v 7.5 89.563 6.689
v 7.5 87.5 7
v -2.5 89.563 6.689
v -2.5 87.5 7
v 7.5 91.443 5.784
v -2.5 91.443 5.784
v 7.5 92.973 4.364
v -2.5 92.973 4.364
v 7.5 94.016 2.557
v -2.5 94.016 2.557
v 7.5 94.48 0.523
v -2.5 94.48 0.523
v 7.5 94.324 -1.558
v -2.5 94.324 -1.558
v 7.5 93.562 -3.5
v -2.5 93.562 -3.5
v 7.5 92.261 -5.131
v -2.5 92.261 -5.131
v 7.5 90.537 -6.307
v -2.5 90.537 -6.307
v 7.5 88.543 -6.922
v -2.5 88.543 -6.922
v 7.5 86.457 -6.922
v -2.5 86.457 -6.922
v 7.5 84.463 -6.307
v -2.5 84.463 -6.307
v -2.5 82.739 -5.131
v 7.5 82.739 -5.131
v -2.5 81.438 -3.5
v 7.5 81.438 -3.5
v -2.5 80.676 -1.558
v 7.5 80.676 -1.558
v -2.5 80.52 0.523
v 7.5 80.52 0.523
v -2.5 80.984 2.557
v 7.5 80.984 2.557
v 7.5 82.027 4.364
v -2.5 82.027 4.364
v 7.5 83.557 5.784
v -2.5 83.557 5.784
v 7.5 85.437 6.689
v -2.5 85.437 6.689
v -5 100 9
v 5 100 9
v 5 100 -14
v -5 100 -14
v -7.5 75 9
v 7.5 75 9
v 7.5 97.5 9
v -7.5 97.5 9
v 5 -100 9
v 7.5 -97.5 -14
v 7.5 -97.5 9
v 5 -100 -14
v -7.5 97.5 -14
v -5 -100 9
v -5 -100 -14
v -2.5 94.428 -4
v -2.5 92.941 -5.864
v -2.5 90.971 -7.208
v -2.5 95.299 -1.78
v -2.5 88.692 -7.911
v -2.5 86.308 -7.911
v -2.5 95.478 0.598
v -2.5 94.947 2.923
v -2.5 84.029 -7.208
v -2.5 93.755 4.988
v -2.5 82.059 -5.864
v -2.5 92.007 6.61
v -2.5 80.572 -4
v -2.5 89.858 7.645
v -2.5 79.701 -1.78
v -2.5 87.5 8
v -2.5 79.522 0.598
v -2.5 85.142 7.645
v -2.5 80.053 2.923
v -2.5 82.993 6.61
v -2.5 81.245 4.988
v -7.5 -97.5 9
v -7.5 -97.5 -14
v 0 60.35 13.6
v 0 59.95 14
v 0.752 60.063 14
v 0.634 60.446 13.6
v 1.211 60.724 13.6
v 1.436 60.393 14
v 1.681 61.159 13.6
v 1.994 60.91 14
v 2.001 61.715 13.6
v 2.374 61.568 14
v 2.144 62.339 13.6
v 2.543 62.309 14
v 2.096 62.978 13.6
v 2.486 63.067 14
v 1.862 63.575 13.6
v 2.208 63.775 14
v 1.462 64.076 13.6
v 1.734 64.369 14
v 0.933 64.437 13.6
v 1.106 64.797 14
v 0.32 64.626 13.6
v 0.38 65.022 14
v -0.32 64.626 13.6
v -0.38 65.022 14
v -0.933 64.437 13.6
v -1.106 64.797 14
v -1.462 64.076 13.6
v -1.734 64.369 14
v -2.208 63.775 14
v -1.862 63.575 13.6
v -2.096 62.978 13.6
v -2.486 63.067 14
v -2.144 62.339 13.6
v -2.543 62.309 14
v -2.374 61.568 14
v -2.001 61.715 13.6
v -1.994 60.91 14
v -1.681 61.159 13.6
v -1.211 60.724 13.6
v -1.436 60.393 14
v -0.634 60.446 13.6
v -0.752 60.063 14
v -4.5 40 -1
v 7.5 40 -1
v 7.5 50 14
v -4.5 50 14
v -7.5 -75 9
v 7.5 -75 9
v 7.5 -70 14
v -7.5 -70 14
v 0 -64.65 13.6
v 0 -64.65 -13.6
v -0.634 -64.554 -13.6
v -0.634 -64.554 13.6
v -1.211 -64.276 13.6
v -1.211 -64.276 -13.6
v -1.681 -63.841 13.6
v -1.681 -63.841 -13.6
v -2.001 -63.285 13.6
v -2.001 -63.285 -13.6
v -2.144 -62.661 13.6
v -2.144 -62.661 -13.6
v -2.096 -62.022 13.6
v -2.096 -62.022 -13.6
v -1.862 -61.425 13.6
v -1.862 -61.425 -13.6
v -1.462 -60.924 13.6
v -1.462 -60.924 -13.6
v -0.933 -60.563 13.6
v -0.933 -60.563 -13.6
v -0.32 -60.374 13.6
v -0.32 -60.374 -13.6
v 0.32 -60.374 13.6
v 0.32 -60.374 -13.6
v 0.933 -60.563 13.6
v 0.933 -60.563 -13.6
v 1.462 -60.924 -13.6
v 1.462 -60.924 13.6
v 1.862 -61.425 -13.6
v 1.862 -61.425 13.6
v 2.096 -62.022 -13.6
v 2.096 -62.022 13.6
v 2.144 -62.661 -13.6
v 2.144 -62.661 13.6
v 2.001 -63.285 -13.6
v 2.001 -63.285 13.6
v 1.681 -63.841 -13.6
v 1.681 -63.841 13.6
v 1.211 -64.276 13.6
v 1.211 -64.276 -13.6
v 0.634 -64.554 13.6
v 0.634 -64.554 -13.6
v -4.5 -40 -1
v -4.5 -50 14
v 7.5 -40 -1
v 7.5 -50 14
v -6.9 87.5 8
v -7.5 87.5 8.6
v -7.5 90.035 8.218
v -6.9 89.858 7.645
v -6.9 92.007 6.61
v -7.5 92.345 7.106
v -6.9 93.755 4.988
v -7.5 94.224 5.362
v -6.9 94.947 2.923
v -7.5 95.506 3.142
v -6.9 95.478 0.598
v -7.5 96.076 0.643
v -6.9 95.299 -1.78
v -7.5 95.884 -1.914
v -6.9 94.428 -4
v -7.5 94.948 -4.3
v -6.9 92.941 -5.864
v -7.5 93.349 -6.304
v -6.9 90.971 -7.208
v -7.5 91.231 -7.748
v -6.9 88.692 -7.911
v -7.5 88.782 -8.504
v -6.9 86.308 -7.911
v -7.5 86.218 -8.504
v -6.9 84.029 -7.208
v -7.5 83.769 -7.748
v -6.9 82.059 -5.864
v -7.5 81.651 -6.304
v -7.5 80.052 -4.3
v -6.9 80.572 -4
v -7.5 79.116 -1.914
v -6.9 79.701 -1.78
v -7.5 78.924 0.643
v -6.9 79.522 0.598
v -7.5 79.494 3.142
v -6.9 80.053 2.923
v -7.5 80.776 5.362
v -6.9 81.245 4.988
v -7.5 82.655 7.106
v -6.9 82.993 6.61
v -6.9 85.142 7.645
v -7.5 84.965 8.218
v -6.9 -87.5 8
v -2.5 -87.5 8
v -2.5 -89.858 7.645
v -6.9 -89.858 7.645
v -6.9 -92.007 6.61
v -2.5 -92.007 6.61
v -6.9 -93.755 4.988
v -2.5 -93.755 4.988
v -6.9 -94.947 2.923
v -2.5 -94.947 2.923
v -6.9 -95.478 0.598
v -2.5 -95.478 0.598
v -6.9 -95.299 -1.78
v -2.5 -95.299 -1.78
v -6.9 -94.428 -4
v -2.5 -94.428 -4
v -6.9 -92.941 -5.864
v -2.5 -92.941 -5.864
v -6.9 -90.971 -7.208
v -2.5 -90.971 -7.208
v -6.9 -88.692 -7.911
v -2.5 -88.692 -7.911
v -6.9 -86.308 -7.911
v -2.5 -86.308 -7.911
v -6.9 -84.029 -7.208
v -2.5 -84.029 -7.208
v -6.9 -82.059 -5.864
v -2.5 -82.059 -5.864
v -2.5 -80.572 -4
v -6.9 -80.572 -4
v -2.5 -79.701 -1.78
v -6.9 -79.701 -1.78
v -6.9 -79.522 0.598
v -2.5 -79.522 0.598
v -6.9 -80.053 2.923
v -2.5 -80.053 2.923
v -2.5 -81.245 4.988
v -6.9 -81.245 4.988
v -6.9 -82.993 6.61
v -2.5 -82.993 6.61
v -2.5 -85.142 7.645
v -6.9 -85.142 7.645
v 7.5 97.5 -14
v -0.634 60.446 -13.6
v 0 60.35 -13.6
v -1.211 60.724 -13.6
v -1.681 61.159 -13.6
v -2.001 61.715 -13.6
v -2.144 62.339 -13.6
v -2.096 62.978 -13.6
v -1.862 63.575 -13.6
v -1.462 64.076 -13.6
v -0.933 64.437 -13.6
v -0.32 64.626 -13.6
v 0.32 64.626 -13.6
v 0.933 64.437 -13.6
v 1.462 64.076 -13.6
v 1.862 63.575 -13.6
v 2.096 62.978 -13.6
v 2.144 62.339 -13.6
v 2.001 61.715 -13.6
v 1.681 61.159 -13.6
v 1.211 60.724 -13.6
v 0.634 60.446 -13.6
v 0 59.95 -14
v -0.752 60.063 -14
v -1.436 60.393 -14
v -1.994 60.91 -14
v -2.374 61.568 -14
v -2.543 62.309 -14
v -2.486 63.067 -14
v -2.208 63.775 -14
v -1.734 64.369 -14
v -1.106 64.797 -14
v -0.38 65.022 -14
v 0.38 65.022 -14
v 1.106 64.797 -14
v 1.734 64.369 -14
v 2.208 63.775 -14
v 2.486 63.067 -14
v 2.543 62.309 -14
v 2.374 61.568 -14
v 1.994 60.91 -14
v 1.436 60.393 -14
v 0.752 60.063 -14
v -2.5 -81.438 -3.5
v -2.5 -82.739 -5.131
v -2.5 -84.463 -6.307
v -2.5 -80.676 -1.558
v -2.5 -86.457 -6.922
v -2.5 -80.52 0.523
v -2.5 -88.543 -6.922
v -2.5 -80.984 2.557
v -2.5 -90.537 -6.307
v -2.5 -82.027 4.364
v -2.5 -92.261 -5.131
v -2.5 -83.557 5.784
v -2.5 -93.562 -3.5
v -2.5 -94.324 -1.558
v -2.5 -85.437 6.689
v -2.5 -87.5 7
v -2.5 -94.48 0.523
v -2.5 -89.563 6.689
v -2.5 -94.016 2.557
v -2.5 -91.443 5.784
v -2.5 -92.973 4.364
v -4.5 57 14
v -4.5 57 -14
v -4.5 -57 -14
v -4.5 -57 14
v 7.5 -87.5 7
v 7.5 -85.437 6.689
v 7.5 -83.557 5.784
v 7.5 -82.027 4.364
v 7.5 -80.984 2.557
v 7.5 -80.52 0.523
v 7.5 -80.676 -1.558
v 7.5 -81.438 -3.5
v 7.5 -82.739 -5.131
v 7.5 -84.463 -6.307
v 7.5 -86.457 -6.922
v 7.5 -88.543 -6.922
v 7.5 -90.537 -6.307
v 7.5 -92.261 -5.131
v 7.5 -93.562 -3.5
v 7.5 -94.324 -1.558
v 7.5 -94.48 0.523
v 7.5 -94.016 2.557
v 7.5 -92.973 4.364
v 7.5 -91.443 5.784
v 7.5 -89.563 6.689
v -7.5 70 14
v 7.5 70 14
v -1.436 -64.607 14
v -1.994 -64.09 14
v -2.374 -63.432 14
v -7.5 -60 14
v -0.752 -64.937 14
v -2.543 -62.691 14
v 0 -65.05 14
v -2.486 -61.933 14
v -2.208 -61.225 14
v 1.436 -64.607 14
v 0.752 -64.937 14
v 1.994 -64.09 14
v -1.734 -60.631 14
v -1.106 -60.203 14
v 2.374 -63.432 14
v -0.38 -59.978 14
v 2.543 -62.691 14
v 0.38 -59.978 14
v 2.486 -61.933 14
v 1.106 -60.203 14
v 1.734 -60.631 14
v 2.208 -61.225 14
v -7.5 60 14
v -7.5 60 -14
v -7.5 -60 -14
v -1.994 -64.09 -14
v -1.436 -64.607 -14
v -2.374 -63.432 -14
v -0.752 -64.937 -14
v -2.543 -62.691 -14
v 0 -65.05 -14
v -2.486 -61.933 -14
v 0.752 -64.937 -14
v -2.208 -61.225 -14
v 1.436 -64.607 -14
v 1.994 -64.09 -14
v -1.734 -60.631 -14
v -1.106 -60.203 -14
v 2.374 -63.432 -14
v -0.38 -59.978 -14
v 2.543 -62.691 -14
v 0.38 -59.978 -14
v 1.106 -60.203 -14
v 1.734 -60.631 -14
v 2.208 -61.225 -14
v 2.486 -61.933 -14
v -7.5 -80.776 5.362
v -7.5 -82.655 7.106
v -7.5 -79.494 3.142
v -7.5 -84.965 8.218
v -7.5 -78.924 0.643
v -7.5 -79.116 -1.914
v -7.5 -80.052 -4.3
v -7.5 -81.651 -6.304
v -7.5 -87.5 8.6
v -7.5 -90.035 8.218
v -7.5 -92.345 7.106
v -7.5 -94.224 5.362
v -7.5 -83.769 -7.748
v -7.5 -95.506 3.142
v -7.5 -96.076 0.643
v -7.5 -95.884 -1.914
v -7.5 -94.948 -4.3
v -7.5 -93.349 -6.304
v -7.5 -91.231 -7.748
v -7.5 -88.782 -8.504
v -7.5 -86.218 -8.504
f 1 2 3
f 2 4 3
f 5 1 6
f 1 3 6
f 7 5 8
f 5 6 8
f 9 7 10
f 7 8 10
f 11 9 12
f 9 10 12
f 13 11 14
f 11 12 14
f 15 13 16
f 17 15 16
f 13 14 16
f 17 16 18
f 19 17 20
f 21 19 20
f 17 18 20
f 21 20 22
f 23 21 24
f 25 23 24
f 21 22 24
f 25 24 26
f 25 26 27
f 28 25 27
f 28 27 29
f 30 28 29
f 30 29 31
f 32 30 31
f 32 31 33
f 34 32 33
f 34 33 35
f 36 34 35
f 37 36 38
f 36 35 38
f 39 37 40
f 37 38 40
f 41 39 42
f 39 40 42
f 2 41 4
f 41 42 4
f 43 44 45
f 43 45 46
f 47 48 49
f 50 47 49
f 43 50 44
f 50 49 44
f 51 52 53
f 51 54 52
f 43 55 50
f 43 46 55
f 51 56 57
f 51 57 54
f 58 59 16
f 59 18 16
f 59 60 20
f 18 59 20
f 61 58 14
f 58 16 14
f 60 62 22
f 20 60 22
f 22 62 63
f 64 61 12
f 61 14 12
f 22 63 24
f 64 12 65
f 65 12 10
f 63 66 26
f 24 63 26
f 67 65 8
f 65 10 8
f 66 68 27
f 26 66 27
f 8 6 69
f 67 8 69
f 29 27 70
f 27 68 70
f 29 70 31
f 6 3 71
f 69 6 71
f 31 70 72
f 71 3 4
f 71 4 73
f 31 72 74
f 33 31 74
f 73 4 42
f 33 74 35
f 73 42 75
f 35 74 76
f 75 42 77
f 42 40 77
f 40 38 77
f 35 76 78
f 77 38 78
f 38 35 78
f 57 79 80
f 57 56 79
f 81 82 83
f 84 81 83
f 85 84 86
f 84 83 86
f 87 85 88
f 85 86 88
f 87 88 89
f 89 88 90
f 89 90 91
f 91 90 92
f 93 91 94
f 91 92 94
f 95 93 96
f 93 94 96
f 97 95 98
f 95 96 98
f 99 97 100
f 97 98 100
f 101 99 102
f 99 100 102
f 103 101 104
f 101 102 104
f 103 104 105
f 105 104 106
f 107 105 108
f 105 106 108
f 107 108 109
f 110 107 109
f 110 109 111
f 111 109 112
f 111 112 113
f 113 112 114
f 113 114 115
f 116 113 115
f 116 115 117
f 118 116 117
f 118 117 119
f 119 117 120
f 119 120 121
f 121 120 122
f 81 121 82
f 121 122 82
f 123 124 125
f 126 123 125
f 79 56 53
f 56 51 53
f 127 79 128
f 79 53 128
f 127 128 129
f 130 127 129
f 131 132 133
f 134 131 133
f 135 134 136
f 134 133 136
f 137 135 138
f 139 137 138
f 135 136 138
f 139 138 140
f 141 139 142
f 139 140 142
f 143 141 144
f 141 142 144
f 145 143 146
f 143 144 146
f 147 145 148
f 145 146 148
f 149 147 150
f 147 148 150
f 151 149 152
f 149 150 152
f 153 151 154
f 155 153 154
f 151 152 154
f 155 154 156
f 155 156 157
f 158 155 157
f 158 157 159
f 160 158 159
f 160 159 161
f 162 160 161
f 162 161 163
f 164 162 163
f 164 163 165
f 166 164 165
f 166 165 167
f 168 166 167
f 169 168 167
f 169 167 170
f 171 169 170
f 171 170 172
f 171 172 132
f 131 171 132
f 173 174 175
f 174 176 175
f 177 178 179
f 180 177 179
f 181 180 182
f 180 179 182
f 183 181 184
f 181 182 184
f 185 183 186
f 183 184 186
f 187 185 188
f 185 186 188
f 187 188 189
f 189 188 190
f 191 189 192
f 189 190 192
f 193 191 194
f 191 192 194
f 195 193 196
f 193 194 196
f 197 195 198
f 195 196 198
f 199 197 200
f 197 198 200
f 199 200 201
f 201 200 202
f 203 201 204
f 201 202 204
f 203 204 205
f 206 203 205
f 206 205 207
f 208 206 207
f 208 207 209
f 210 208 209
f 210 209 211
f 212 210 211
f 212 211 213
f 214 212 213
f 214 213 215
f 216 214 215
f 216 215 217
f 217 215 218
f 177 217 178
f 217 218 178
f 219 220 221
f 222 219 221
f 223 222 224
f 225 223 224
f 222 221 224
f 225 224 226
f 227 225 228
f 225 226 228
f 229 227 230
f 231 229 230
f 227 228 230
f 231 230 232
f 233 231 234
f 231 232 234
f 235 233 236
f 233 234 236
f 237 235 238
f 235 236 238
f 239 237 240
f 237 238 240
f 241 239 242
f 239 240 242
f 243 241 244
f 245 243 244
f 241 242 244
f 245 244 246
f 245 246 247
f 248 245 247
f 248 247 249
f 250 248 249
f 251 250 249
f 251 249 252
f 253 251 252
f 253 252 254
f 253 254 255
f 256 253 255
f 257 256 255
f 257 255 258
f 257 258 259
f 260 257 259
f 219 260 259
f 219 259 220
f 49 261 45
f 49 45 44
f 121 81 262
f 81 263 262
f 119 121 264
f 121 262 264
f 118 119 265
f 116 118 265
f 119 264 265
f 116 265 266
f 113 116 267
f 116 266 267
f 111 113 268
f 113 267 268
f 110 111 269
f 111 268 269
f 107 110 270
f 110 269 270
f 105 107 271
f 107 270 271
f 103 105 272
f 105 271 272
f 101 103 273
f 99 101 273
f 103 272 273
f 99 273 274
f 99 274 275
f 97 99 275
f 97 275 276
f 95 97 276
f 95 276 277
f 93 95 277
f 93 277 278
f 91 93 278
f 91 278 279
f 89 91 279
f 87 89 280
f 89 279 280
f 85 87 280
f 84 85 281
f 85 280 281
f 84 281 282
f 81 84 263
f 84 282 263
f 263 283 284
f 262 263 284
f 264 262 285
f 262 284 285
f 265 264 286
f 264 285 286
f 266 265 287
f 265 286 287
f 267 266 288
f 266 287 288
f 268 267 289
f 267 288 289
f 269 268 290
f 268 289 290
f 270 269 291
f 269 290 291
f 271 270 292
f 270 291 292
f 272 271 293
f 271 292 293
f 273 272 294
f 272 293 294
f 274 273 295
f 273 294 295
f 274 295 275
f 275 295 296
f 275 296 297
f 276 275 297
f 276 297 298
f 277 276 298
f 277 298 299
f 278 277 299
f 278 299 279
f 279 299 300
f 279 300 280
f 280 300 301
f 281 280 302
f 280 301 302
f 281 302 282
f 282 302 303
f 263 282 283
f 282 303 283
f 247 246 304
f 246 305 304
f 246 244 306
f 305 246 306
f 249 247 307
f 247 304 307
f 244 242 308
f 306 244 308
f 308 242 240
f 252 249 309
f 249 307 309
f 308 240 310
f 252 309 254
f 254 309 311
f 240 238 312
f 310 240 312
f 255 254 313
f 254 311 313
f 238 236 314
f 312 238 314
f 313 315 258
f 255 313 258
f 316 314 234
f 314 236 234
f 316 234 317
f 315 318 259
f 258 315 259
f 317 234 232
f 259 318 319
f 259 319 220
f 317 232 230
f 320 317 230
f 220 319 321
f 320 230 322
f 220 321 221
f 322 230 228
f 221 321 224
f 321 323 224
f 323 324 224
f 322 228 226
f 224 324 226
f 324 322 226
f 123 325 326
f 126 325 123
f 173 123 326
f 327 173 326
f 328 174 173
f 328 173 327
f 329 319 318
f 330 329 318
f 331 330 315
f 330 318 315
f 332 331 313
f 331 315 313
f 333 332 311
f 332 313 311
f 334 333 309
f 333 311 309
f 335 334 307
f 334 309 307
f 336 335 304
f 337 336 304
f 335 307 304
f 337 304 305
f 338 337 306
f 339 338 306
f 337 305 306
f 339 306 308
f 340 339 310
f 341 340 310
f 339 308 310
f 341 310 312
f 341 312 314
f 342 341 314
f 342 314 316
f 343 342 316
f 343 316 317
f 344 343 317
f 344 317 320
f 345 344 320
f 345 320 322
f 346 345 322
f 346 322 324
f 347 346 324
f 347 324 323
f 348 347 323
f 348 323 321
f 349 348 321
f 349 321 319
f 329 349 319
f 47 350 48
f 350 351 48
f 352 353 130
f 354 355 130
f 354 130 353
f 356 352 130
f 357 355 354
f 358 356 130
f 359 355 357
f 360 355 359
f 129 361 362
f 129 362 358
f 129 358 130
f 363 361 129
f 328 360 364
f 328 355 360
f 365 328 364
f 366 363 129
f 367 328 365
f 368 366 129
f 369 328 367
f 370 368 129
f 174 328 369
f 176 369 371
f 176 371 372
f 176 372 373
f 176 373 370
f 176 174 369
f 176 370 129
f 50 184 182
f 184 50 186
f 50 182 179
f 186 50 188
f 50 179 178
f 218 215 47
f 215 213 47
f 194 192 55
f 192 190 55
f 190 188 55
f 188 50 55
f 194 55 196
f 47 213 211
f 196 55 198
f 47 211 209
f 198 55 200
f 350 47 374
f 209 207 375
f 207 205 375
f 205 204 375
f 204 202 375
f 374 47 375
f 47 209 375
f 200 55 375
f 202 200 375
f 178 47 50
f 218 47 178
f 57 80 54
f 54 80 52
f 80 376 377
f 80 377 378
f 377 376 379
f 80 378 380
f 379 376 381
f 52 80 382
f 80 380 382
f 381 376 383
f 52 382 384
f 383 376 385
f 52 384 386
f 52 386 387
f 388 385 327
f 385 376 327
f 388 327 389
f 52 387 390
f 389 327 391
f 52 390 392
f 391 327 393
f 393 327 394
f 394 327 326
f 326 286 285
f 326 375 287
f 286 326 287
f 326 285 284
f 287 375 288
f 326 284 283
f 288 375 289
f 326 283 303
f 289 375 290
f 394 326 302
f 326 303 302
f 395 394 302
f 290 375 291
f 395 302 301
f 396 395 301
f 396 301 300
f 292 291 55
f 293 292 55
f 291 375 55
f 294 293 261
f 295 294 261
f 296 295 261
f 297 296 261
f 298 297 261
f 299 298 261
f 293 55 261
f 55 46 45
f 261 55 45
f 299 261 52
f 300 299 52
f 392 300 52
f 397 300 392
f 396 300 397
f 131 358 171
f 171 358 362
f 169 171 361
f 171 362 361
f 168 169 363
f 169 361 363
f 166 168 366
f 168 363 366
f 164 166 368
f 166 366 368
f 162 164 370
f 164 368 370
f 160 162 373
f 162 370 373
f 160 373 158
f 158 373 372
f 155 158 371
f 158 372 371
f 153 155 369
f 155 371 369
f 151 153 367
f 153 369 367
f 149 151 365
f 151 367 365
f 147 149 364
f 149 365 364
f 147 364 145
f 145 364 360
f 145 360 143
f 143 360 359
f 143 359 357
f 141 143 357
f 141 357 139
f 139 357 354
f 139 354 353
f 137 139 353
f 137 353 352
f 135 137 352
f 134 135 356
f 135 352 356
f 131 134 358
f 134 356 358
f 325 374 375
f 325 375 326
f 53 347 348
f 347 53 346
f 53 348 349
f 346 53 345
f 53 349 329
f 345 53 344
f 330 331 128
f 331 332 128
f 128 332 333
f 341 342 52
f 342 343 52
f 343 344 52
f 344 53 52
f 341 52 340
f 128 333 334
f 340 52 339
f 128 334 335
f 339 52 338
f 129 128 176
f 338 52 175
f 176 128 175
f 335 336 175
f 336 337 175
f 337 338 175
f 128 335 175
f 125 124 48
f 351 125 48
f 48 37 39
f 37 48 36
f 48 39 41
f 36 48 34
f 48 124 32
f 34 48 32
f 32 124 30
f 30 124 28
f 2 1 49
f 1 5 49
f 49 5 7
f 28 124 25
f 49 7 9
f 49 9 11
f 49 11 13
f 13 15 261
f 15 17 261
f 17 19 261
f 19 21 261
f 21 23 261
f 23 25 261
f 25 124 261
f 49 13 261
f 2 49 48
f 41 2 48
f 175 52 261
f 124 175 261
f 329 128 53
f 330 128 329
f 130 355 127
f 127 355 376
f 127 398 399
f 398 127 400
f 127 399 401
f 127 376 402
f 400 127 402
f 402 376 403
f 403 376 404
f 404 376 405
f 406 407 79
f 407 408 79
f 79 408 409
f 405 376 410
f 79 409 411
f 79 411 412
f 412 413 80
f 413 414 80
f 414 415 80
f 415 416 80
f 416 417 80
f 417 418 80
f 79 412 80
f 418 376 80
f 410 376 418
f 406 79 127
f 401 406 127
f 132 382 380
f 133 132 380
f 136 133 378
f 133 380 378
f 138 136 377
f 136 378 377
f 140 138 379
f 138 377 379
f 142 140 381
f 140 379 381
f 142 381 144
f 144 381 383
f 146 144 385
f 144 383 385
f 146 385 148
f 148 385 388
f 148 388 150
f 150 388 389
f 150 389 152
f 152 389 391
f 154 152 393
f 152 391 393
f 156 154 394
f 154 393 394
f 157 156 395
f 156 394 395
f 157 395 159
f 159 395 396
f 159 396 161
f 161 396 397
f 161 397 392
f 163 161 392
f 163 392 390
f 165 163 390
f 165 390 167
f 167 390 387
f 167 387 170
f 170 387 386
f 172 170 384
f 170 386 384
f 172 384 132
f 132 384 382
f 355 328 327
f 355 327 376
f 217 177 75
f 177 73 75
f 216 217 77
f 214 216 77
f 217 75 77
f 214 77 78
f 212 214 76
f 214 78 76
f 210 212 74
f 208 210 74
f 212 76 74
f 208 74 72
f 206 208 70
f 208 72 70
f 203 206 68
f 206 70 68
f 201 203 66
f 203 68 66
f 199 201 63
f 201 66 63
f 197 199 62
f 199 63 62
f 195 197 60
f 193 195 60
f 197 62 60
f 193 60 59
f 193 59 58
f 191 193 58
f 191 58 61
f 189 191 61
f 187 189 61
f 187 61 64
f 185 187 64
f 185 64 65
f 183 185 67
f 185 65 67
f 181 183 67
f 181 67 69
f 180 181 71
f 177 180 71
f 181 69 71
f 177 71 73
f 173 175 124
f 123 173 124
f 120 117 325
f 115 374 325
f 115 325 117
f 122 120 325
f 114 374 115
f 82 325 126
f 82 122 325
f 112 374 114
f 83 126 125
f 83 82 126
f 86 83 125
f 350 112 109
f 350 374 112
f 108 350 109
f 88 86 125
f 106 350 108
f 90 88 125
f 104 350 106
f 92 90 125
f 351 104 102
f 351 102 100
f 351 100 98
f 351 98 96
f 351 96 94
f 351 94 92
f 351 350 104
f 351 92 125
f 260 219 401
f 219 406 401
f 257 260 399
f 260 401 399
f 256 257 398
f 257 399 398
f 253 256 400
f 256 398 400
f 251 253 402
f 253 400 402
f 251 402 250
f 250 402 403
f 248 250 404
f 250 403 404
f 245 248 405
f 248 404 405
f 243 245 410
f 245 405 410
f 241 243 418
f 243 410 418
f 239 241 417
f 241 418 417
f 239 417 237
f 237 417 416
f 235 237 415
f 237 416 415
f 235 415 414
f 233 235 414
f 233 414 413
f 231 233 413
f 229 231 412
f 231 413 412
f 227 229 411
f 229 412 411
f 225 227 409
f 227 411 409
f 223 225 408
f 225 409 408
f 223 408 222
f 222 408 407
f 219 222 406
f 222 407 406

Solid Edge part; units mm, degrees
sketch "Sketch1" plane through (0, 0, 0) normal (0, 0, 1) x (1, 0, 0)
  line L0 (-7.5, -100) -> (7.5, -100)
  line L1 (7.5, -100) -> (7.5, 100)
  line L2 (7.5, 100) -> (-7.5, 100)
  line L3 (-7.5, 100) -> (-7.5, -100)
  dimension "D1" = 15
  dimension "D2" = 200
extrude "Protrusion1" add sketch "Sketch1" along normal mid plane 28
hole "Hole_1" at (-7.5, 87.5, 0) direction (1, 0, 0) diameter 14 end up to next counterbore diameter 16 counterbore depth 5 start chamfer 0.6 start chamfer angle 45
hole "Hole1" at (-7.5, -87.5, 0) direction (1, 0, 0) diameter 14 end up to next counterbore diameter 16 counterbore depth 5 start chamfer 0.6 start chamfer angle 45
hole "Hole_3" at (0, 62.5, 14) direction (0, 0, -1) diameter 4.3 depth 30 tip angle 118 start chamfer 0.4 start chamfer angle 45 end chamfer 0.4 end chamfer angle 45
hole "Hole2" at (0, -62.5, 14) direction (0, 0, -1) diameter 4.3 depth 30 tip angle 118 start chamfer 0.4 start chamfer angle 45 end chamfer 0.4 end chamfer angle 45
sketch "Sketch2" plane through (0, 0, 14) normal (0, 0, 1) x (0, -1, 0)
  line L0 (-60, -7.5) -> (-57, -4.5)
  line L1 (-57, -4.5) -> (57, -4.5)
  line L2 (57, -4.5) -> (60, -7.5)
  line L3 (60, -7.5) -> (-60, -7.5)
  dimension "D1" = 120
  dimension "D2" = 3
extrude "Cutout1" cut sketch "Sketch2" against normal up to next
chamfer "Chamfer_1" distance 2.5 angle 45 4 edges at (-7.5, 100, 0) (7.5, 100, 0) (-7.5, -100, 0) (7.5, -100, 0)
sketch "Sketch3" plane through (7.5, 0, 0) normal (1, 0, 0) x (0, 1, 0)
  line L0 (-100, 9) -> (-75, 9)
  line L1 (-75, 9) -> (-70, 14)
  line L2 (-70, 14) -> (-100, 14)
  line L3 (-100, 14) -> (-100, 9)
  dimension "D1" = 30
  dimension "D2" = 5
  dimension "D3" = 25
extrude "Cutout2" cut sketch "Sketch3" against normal up to next
mirror "Mirror1" about plane through (0, 0, 0) normal (0, -1, 0) of "Cutout2"
sketch "Sketch4" plane through (7.5, 0, 0) normal (1, 0, 0) x (0, 1, 0)
  line L0 (-50, 14) -> (-40, -1)
  line L1 (-40, -1) -> (40, -1)
  line L2 (40, -1) -> (50, 14)
  line L3 (50, 14) -> (-50, 14)
  dimension "D1" = 100
  dimension "D2" = 80
  dimension "D3" = 15
extrude "Cutout3" cut sketch "Sketch4" against normal up to next
properties material "Polyethylene, low density"
